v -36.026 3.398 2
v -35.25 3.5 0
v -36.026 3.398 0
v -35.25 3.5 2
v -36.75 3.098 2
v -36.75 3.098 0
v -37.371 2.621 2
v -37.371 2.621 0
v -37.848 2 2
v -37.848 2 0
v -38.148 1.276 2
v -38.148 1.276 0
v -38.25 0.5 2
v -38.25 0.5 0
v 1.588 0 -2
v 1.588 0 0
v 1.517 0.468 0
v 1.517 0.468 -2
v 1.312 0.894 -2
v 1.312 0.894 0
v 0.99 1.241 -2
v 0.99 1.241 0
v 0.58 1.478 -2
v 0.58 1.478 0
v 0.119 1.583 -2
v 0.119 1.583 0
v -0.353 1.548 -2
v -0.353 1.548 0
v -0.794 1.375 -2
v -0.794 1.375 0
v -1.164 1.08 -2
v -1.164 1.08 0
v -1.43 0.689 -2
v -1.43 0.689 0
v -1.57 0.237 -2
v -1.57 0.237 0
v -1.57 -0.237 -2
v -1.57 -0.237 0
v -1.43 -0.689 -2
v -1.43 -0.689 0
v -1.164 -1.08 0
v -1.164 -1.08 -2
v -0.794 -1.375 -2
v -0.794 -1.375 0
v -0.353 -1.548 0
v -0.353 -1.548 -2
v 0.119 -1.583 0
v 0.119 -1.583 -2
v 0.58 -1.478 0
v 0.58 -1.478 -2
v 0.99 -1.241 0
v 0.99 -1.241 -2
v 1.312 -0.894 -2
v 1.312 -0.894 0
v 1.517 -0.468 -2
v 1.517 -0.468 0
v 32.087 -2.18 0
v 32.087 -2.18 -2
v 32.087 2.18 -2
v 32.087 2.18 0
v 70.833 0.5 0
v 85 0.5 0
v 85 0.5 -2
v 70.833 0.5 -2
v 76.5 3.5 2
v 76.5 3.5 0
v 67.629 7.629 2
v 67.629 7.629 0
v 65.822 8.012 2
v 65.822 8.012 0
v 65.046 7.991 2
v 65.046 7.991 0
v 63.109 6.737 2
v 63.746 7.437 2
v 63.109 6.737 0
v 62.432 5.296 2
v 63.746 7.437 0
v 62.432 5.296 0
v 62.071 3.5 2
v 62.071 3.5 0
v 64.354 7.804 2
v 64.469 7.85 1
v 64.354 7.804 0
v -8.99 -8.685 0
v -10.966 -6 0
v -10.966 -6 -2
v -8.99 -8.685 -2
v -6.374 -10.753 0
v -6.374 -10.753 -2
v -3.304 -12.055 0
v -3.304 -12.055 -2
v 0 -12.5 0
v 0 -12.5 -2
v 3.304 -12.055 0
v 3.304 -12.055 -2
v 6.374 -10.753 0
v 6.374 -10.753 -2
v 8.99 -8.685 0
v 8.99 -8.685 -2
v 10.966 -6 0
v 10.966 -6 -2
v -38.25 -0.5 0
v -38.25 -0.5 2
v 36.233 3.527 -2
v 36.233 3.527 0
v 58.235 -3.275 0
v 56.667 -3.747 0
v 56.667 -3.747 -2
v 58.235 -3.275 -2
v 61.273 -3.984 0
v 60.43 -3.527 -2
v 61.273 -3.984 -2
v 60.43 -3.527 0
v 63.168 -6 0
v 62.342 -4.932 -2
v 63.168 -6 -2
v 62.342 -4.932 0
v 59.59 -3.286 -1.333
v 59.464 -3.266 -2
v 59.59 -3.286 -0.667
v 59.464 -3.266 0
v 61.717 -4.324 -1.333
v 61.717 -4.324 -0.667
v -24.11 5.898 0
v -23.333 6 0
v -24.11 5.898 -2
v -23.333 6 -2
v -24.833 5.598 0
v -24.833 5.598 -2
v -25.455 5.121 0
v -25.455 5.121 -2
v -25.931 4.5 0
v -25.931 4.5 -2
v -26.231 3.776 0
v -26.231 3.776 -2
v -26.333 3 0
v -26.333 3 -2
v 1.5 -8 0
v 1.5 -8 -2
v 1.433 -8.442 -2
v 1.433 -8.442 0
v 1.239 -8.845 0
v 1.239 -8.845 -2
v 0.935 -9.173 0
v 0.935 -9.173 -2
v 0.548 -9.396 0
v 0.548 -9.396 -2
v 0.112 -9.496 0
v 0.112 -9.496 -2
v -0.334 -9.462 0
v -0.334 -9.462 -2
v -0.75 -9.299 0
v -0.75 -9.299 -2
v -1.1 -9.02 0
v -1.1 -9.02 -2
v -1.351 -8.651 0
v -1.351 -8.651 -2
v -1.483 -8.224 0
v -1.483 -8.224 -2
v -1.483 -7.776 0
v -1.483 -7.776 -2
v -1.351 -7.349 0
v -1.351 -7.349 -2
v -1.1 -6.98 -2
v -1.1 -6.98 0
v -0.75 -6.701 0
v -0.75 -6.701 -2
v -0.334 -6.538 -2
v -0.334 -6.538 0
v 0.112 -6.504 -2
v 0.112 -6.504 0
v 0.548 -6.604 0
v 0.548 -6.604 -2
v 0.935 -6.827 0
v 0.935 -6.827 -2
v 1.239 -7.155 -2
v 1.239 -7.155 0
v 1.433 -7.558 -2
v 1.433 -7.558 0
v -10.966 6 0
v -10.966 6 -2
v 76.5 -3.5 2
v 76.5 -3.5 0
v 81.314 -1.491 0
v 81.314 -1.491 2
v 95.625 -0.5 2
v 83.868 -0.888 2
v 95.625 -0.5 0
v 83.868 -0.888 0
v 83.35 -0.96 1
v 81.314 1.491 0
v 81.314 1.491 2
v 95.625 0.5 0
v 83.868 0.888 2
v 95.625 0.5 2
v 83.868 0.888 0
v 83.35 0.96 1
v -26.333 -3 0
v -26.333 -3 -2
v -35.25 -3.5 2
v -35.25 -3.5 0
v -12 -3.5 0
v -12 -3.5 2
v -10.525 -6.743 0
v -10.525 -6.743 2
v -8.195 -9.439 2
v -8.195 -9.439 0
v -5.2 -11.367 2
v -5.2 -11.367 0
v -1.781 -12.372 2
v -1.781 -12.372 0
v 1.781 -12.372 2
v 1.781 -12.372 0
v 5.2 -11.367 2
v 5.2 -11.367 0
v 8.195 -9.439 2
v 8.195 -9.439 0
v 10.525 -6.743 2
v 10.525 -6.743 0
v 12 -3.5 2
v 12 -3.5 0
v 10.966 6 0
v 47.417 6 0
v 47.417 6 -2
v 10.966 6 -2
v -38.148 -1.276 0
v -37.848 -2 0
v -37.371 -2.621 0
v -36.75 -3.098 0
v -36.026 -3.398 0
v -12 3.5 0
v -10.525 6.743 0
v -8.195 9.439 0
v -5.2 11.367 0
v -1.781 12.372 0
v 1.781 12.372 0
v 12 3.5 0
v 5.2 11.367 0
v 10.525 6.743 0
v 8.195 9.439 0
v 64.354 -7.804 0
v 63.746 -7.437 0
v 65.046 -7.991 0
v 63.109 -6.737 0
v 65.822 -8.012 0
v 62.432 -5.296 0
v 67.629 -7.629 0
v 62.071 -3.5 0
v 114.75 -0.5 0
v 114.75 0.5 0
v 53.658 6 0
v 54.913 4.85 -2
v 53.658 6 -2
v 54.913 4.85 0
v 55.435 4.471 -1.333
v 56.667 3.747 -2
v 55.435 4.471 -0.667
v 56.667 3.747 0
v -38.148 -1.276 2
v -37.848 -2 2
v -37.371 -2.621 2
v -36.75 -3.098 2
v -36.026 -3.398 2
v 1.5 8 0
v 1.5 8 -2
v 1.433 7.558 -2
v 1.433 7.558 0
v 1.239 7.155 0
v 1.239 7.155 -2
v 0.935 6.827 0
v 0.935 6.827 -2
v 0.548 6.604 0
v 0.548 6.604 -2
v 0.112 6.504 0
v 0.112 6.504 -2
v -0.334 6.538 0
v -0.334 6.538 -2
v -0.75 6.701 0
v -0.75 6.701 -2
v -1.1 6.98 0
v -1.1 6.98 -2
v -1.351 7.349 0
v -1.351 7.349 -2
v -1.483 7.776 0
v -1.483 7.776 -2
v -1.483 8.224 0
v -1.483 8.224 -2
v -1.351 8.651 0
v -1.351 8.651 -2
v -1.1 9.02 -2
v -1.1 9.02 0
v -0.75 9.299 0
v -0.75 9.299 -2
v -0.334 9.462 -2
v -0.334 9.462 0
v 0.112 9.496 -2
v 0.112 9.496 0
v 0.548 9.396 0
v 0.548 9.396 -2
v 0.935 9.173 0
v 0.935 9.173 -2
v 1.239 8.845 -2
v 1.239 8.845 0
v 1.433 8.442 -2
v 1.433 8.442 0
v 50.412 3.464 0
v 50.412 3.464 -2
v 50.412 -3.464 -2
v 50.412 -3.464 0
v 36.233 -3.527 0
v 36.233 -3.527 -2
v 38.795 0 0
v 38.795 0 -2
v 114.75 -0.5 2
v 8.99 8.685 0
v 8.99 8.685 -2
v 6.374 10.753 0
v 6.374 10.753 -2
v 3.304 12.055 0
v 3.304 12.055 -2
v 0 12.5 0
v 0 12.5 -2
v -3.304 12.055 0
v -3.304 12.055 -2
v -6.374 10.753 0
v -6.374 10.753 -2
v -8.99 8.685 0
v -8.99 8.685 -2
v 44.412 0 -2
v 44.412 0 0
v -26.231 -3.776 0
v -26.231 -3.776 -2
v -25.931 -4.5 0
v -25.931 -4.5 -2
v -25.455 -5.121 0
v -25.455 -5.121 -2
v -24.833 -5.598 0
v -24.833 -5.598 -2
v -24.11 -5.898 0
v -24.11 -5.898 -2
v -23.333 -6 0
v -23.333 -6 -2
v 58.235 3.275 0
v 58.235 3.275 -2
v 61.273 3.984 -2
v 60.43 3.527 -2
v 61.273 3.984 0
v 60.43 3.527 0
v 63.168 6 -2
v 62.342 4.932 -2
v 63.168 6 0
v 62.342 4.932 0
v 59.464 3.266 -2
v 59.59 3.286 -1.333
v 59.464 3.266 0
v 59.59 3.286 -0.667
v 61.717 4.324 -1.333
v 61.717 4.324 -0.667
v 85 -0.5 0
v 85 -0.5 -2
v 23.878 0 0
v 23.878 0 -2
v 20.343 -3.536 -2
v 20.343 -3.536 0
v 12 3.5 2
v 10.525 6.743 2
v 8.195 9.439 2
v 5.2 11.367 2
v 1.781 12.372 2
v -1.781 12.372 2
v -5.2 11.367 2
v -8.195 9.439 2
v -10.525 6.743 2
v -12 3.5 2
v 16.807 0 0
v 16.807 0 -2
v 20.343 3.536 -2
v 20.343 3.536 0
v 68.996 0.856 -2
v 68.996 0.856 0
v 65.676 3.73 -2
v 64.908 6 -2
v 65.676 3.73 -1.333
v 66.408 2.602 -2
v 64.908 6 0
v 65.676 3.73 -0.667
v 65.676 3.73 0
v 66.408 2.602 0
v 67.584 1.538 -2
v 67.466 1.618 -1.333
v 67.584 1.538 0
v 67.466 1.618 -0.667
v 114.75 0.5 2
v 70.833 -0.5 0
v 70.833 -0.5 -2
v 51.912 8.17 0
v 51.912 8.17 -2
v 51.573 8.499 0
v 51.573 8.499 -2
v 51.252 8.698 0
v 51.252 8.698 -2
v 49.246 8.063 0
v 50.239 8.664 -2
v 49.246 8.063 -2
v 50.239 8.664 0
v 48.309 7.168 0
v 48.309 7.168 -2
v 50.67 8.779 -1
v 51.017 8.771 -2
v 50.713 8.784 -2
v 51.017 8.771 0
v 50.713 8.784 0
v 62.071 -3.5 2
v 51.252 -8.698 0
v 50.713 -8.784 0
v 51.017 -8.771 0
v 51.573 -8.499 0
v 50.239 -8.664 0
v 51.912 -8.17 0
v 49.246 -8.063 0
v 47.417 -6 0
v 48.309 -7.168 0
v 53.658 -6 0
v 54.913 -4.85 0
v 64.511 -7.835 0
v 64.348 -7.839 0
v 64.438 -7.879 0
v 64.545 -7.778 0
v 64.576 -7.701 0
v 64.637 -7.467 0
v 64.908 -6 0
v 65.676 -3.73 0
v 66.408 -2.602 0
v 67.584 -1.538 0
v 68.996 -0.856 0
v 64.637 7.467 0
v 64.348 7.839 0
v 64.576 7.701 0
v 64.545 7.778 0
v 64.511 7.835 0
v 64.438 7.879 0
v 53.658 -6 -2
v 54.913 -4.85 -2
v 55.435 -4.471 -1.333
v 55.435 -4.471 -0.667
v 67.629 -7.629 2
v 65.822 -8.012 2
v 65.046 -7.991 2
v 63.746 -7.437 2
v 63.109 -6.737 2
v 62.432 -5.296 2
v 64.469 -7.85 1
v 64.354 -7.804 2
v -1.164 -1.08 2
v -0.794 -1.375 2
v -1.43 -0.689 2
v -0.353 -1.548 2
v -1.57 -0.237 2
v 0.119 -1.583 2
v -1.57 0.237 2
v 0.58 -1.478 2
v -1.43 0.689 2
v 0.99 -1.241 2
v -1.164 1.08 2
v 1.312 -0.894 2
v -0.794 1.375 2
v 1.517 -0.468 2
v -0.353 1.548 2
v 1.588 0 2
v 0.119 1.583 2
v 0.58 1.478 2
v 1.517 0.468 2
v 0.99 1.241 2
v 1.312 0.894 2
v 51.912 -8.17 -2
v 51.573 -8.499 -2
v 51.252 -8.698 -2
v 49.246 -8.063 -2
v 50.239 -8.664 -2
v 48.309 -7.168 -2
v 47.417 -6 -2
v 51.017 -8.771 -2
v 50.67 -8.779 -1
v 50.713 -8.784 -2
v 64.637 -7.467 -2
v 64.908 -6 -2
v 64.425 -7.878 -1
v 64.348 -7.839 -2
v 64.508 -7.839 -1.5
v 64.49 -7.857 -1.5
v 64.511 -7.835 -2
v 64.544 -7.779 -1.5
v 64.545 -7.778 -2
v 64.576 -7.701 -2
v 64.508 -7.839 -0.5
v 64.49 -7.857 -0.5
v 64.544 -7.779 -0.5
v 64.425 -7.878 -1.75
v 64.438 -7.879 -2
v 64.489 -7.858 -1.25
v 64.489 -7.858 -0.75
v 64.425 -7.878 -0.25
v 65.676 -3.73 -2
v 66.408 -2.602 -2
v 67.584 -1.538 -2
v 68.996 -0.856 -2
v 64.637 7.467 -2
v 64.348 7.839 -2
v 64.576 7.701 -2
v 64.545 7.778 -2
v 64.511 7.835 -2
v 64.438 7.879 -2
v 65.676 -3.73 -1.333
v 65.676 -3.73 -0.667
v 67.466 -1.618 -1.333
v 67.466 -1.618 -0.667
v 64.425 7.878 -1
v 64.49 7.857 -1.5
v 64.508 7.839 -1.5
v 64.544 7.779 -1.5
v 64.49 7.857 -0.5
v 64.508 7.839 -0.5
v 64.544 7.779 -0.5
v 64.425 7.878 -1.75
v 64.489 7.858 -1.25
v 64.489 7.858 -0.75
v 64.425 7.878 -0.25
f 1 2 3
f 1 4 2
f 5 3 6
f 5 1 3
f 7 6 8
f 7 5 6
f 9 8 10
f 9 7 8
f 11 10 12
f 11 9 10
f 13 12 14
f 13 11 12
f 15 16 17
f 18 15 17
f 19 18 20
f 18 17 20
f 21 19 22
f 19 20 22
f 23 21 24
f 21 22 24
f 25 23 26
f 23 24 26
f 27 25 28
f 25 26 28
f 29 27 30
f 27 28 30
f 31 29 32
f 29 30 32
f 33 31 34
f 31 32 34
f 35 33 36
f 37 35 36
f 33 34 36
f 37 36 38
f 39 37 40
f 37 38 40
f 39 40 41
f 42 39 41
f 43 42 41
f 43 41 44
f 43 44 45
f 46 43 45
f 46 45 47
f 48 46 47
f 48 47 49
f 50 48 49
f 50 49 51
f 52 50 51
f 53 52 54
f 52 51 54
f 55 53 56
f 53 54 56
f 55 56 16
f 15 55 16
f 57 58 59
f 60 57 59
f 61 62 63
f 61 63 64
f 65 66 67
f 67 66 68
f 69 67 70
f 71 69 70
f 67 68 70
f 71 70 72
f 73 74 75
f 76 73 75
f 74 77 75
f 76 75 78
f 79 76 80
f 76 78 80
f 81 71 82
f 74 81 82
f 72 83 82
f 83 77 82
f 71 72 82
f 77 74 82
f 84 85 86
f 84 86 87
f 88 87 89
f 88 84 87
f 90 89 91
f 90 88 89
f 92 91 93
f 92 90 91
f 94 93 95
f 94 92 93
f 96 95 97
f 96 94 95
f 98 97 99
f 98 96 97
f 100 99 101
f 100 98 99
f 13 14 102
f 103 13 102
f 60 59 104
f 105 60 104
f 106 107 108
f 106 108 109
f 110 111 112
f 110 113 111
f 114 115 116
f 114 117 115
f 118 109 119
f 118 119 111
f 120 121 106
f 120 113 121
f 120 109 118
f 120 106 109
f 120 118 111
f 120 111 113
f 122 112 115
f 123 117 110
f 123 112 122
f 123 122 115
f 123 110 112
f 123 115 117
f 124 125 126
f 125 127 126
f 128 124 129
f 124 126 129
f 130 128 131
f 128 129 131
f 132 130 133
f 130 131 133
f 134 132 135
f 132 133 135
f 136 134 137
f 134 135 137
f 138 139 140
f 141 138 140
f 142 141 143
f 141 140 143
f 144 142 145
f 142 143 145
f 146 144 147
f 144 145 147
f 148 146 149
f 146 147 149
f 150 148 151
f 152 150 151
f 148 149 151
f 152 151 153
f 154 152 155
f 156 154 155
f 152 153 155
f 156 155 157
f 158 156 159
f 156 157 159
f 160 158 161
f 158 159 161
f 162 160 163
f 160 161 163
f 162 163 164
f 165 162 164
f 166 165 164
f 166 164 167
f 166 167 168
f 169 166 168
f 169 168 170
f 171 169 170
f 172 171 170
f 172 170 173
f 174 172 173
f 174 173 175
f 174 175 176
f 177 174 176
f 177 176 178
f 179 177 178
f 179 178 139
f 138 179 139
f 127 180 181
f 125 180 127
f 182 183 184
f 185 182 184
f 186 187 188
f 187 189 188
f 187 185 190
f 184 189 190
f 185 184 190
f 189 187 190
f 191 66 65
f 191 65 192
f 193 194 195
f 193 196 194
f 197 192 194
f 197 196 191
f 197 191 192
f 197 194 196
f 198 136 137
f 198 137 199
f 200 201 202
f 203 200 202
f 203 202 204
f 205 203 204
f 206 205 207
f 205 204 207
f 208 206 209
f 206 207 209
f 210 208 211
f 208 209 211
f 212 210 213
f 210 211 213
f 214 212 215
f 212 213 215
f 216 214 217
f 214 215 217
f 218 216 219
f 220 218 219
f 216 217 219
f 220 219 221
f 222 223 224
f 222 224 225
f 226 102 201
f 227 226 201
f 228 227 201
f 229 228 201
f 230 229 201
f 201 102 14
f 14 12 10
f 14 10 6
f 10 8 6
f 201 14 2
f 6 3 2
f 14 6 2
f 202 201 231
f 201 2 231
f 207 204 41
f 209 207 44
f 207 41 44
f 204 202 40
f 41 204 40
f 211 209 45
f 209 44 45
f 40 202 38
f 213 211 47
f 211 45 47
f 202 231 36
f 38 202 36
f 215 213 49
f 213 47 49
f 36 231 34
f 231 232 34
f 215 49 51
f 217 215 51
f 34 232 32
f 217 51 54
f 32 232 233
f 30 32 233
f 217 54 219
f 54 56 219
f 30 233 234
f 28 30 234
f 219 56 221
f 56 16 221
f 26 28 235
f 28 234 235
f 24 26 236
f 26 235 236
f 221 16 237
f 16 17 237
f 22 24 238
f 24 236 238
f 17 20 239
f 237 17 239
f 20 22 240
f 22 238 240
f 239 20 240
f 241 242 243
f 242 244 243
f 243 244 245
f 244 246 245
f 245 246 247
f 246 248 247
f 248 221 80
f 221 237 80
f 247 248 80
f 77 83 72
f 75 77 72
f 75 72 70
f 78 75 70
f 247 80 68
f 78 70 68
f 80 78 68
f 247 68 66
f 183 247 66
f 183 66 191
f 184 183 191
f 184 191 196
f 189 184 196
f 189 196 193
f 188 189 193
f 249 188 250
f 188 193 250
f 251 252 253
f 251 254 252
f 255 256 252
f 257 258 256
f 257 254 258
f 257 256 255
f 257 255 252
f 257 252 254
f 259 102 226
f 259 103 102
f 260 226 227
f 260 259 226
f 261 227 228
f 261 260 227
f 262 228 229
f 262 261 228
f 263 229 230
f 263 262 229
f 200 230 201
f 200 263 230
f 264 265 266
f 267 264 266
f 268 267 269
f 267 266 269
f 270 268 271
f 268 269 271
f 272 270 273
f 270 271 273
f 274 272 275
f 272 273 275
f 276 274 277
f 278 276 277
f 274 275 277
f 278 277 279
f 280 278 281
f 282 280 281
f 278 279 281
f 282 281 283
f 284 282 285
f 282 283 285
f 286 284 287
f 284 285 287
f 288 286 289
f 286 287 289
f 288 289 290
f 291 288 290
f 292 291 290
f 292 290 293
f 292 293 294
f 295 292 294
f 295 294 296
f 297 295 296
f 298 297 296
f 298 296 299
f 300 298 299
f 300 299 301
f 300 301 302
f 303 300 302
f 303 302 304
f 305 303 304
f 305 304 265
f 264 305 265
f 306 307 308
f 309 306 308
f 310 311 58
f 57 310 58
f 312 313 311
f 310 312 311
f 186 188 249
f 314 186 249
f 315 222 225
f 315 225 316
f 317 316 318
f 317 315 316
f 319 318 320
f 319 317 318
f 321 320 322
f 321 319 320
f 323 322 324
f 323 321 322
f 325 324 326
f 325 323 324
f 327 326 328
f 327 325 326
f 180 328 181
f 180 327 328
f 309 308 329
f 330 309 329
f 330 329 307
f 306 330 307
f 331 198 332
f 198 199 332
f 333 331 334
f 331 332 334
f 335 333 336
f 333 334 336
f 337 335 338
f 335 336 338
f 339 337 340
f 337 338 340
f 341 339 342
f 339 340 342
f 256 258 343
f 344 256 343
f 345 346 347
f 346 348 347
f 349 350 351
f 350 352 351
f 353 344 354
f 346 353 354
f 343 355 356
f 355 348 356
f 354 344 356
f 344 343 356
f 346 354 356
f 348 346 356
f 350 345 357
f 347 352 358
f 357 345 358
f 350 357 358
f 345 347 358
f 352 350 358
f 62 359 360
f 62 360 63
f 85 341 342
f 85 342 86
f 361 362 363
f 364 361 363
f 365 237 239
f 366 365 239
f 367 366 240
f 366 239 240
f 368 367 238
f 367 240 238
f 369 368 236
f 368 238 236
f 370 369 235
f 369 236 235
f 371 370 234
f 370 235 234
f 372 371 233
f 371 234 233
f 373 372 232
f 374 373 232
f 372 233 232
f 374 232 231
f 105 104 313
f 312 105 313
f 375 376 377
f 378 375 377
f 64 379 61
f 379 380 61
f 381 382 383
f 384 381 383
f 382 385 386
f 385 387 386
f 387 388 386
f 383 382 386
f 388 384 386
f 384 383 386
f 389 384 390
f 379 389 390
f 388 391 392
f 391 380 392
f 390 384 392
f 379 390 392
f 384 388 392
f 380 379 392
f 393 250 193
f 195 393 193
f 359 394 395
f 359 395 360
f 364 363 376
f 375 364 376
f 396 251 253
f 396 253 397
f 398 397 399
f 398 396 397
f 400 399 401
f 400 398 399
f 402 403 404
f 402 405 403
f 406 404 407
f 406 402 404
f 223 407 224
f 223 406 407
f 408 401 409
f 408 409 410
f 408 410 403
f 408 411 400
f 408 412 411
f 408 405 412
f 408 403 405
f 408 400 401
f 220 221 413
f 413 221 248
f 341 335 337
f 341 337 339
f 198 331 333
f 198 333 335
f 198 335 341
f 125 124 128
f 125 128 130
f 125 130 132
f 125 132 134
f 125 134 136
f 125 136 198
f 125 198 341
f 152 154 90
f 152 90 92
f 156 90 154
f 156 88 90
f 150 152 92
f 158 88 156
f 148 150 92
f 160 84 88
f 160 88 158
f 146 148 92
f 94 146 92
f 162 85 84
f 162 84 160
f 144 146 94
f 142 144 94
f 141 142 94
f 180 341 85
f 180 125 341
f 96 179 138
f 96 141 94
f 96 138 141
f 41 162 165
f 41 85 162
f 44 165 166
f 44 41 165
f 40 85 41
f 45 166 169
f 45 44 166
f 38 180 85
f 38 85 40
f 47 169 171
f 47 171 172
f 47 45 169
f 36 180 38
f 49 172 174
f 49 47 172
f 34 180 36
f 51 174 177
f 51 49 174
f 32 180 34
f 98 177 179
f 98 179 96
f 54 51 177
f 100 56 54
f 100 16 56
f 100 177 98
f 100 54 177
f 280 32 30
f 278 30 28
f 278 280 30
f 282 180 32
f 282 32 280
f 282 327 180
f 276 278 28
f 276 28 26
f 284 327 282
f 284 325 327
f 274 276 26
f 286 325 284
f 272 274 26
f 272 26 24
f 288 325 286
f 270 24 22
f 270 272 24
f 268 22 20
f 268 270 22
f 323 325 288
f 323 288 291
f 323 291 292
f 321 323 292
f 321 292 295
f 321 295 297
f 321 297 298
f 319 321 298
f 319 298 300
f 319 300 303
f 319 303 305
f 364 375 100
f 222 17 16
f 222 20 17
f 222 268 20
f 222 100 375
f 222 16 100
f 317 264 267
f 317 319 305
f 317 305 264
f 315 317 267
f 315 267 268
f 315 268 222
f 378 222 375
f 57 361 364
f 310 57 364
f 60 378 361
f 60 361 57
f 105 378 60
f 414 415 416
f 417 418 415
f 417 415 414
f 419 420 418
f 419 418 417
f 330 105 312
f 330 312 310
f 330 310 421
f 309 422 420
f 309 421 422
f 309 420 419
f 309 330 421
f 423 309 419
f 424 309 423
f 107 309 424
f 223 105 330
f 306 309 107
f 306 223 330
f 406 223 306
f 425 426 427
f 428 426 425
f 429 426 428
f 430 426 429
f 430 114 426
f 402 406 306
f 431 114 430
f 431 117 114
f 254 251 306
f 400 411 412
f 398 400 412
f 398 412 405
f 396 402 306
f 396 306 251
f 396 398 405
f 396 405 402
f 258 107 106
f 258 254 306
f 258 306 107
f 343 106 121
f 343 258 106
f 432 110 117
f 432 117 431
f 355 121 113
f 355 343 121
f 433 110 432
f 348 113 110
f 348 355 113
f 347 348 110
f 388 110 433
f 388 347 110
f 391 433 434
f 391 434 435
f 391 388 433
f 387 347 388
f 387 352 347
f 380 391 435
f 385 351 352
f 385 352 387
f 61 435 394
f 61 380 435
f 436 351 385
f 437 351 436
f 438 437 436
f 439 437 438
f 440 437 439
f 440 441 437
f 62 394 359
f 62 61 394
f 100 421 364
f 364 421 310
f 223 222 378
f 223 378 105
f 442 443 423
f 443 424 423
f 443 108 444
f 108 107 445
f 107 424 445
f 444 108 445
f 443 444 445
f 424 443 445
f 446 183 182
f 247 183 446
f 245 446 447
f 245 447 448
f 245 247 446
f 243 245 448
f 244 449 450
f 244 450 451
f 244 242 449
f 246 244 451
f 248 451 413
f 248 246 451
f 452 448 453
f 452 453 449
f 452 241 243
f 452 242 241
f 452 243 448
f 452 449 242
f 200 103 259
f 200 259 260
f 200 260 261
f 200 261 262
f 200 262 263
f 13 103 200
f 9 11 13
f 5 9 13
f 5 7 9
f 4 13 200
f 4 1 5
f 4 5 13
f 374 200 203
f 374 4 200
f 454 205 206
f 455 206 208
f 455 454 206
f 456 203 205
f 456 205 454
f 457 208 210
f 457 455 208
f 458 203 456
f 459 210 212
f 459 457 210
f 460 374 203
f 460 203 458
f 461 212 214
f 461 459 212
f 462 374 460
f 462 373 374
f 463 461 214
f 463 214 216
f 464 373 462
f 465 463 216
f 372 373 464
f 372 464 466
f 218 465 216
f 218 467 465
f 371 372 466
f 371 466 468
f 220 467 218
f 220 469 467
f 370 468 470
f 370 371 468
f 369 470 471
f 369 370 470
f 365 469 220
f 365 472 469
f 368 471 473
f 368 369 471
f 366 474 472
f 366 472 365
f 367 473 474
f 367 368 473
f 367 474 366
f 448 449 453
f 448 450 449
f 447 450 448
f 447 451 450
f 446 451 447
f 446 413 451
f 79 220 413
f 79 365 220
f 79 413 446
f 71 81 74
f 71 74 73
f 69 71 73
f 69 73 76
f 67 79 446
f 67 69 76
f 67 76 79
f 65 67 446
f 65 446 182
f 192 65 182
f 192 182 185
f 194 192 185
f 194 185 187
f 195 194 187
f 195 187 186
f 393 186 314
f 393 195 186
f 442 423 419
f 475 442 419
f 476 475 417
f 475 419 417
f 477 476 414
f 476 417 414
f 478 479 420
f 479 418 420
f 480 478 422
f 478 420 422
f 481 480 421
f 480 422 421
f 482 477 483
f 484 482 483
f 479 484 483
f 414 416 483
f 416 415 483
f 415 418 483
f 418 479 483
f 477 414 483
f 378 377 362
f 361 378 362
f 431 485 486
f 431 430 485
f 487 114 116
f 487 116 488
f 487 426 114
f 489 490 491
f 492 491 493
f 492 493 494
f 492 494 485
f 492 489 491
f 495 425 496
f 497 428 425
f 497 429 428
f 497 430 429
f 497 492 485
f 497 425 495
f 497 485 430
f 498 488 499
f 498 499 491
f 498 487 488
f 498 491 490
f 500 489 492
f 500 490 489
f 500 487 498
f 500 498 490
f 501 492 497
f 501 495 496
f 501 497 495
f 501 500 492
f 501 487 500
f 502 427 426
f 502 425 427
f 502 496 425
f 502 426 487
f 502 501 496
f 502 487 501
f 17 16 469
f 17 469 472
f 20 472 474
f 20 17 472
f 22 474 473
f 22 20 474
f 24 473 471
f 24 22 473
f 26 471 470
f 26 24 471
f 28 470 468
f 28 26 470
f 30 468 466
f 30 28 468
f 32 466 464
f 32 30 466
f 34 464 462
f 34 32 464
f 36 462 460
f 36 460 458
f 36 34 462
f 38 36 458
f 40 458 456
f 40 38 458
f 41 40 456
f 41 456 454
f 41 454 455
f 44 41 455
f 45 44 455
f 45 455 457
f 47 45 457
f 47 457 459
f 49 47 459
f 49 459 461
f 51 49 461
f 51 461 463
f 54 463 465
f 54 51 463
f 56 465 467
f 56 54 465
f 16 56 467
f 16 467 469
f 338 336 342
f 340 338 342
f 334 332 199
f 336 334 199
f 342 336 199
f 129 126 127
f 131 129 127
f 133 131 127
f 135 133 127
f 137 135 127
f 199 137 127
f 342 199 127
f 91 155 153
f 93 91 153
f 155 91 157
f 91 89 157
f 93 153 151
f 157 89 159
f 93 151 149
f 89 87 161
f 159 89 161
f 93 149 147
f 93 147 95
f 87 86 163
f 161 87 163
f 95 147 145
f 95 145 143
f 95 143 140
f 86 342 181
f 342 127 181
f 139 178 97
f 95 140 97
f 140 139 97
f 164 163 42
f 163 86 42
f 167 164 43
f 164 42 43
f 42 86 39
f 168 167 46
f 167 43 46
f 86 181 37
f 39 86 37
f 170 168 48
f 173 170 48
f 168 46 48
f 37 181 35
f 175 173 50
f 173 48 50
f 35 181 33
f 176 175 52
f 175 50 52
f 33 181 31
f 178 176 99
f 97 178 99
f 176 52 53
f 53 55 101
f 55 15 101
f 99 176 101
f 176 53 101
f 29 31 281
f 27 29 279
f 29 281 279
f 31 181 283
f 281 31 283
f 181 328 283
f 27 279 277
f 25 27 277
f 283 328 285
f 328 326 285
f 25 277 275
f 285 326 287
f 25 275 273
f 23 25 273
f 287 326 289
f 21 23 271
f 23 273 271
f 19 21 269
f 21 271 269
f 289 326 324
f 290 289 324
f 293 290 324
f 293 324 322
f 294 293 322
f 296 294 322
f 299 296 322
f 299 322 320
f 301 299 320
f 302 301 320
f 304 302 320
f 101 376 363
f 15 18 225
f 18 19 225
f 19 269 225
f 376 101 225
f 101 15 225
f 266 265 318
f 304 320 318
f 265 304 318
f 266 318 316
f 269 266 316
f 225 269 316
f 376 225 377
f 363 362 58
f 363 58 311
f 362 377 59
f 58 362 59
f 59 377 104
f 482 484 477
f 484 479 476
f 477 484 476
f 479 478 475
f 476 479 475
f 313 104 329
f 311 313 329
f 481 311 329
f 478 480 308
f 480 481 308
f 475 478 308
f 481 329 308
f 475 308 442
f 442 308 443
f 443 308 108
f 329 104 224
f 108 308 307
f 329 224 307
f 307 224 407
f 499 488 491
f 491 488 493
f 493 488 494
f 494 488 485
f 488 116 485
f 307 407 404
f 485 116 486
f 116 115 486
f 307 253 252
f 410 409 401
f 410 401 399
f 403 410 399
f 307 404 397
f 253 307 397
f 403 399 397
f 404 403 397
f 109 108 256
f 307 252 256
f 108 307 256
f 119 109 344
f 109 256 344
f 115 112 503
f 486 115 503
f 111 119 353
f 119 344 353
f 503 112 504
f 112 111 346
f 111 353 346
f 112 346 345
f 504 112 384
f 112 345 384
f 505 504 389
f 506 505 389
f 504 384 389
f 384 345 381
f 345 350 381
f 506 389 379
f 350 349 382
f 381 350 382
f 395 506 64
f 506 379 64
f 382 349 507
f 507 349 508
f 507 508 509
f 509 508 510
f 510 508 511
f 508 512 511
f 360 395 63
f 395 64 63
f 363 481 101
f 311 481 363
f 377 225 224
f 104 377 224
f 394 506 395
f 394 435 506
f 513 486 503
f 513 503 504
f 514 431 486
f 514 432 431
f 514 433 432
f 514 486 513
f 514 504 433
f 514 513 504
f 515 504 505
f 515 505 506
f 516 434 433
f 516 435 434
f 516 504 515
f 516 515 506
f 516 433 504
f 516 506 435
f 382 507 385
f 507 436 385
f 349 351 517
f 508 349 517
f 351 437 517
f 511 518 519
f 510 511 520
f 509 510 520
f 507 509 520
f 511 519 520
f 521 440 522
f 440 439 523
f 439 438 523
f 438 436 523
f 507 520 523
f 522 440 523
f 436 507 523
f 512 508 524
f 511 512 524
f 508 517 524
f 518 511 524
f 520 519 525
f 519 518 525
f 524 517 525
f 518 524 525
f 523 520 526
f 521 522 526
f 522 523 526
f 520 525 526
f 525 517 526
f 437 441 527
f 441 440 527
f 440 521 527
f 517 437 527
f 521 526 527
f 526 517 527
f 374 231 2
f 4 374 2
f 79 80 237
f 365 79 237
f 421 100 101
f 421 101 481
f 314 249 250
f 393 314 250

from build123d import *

# Parameters (mm, degrees)
F0_R     = 1.5875
F1_DEPTH = 2
F2_R     = 1.5875
F3_DEPTH = 2
F4_R     = 3
F4_2_R   = 3
F6_DEPTH = 25
F7_R     = 1.5
F8_DEPTH = 25


with BuildPart() as f1:
    # F0 (on Top) → F1 (new body)
    with BuildSketch(Plane.XY):
        with BuildLine():
            ThreePointArc((-12, -3.5), (-12.5, 0), (-12, 3.5))
            Line((-12, 3.5), (-38.25, 3.5))
            Line((-38.25, 3.5), (-38.25, -3.5))
            Line((-38.25, -3.5), (-12, -3.5))
        make_face()
        with BuildLine():
            Line((-12, 3.5), (12, 3.5))
            ThreePointArc((12, 3.5), (0, 12.5), (-12, 3.5))
        make_face()
        with BuildLine():
            Line((62.0709539045, 3.5), (76.5, 3.5))
            add(Edge.make_bspline(
                [(76.5, 3.5), (71.9907153616, 5.4354000871), (64.55282786, 10.6078306891), (62.2970592122, 5.6150011273), (62.0709539045, 3.5)],
                knots=[0, 0, 0, 0, 0.5556190741, 0.8480780717, 0.8480780717, 0.8480780717, 0.8480780717], degree=3))
        make_face()
        with BuildLine():
            Line((12, -3.5), (-12, -3.5))
            ThreePointArc((-12, -3.5), (0, -12.5), (12, -3.5))
        make_face()
        with BuildLine():
            Line((76.5, -3.5), (62.0709539045, -3.5))
            add(Edge.make_bspline(
                [(76.5, -3.5), (71.9907153616, -5.4354000871), (64.55282786, -10.6078306891), (62.2970592122, -5.6150011273), (62.0709539045, -3.5)],
                knots=[0, 0, 0, 0, 0.5556190741, 0.8480780717, 0.8480780717, 0.8480780717, 0.8480780717], degree=3))
        make_face()
        with BuildLine():
            add(Edge.make_bspline(
                [(62.0709539045, 3.5), (61.9535003312, 2.401333), (61.9849445935, 1.196556193), (62.15625, 0)],
                knots=[0.8480780717, 0.8480780717, 0.8480780717, 0.8480780717, 1, 1, 1, 1], degree=3))
            Line((62.0709539045, 3.5), (12, 3.5))
            ThreePointArc((12, 3.5), (12.3743686708, 1.767766953), (12.5, 0))
            ThreePointArc((12.5, 0), (12.3743686708, -1.767766953), (12, -3.5))
            Line((12, -3.5), (62.0709539045, -3.5))
            add(Edge.make_bspline(
                [(62.0709539045, -3.5), (61.9535003312, -2.401333), (61.9849445935, -1.196556193), (62.15625, 0)],
                knots=[0.8480780717, 0.8480780717, 0.8480780717, 0.8480780717, 1, 1, 1, 1], degree=3))
        make_face()
        with BuildLine():
            ThreePointArc((12.5, 0), (12.3743686708, 1.767766953), (12, 3.5))
            Line((12, 3.5), (-12, 3.5))
            ThreePointArc((-12, 3.5), (-12.5, 0), (-12, -3.5))
            Line((-12, -3.5), (12, -3.5))
            ThreePointArc((12, -3.5), (12.3743686708, -1.767766953), (12.5, 0))
        make_face()
        Circle(F0_R, mode=Mode.SUBTRACT)
        with BuildLine():
            add(Edge.make_bspline(
                [(76.5, 3.5), (81.2292632272, 1.3920385639), (83.5245438479, 0.7969108606), (86.4633302777, 0.6546642008), (95.625, 0.5)],
                knots=[0, 0, 0, 0, 0.4354164629, 1, 1, 1, 1], degree=3))
            Line((76.5, 3.5), (62.0709539045, 3.5))
            add(Edge.make_bspline(
                [(62.0709539045, 3.5), (61.9535003312, 2.401333), (61.9849445935, 1.196556193), (62.15625, 0)],
                knots=[0.8480780717, 0.8480780717, 0.8480780717, 0.8480780717, 1, 1, 1, 1], degree=3))
            add(Edge.make_bspline(
                [(62.0709539045, -3.5), (61.9535003312, -2.401333), (61.9849445935, -1.196556193), (62.15625, 0)],
                knots=[0.8480780717, 0.8480780717, 0.8480780717, 0.8480780717, 1, 1, 1, 1], degree=3))
            Line((62.0709539045, -3.5), (76.5, -3.5))
            add(Edge.make_bspline(
                [(76.5, -3.5), (81.2292632272, -1.3920385639), (83.5245438479, -0.7969108606), (86.4633302777, -0.6546642008), (95.625, -0.5)],
                knots=[0, 0, 0, 0, 0.4354164629, 1, 1, 1, 1], degree=3))
            Line((95.625, -0.5), (114.75, -0.5))
            Line((114.75, -0.5), (114.75, 0.5))
            Line((114.75, 0.5), (95.625, 0.5))
        make_face()
    extrude(amount=F1_DEPTH)

    # F4
    f4_edges = [f1.edges().sort_by_distance(p)[0] for p in [
        (-38.25, 3.5, 1),
        (-38.25, -3.5, 1),
    ]]
    fillet(f4_edges, radius=F4_R)


with BuildPart() as f3:
    # F2 (on Top) → F3 (new body)
    with BuildSketch(Plane.XY):
        with BuildLine():
            Line((-10.9658560997, 6), (-26.33333333, 6))
            Line((-26.33333333, 6), (-26.33333333, -6))
            Line((-26.33333333, -6), (-10.9658560997, -6))
            ThreePointArc((-10.9658560997, -6), (-12.5, 0), (-10.9658560997, 6))
        make_face()
        with BuildLine():
            ThreePointArc((10.9658560997, 6), (0, 12.5), (-10.9658560997, 6))
            Line((-10.9658560997, 6), (10.9658560997, 6))
        make_face()
        with BuildLine():
            Line((10.9658560997, -6), (-10.9658560997, -6))
            ThreePointArc((-10.9658560997, -6), (0, -12.5), (10.9658560997, -6))
        make_face()
        with BuildLine():
            Line((53.6581738244, 6), (47.4167542526, 6))
            add(Edge.make_bspline(
                [(47.4167542526, 6), (46.3220957553, 4.3280086445), (45.5684344657, 2.1206918096), (46.0416666667, 0)],
                knots=[0.726906329, 0.726906329, 0.726906329, 0.726906329, 1, 1, 1, 1], degree=3))
            add(Edge.make_bspline(
                [(47.4167542526, -6), (46.3220957553, -4.3280086445), (45.5684344657, -2.1206918096), (46.0416666667, 0)],
                knots=[0.726906329, 0.726906329, 0.726906329, 0.726906329, 1, 1, 1, 1], degree=3))
            Line((47.4167542526, -6), (53.6581738244, -6))
            add(Edge.make_bspline(
                [(56.6666666667, -3.747044364), (55.2992674084, -4.4409490289), (54.3604326541, -5.2428049781), (53.6581738244, -6)],
                knots=[0, 0, 0, 0, 0.1542850544, 0.1542850544, 0.1542850544, 0.1542850544], degree=3))
            add(Edge.make_bspline(
                [(56.6666666667, -3.747044364), (60.0277227864, -2.2489301029), (62.0161168237, -4.2916810168), (63.1679295713, -6)],
                knots=[0, 0, 0, 0, 0.3094476025, 0.3094476025, 0.3094476025, 0.3094476025], degree=3))
            Line((63.1679295713, -6), (64.907909688, -6))
            add(Edge.make_bspline(
                [(64.907909688, -6), (65.3495372223, -3.9292189456), (66.4917594583, -0.8436001546), (70.8333333333, -0.5)],
                knots=[0.6644360976, 0.6644360976, 0.6644360976, 0.6644360976, 1, 1, 1, 1], degree=3))
            Line((70.8333333333, -0.5), (85, -0.5))
            Line((85, -0.5), (85, 0.5))
            Line((85, 0.5), (70.8333333333, 0.5))
            add(Edge.make_bspline(
                [(64.907909688, 6), (65.3495372223, 3.9292189456), (66.4917594583, 0.8436001546), (70.8333333333, 0.5)],
                knots=[0.6644360976, 0.6644360976, 0.6644360976, 0.6644360976, 1, 1, 1, 1], degree=3))
            Line((64.907909688, 6), (63.1679295713, 6))
            add(Edge.make_bspline(
                [(56.6666666667, 3.747044364), (60.0277227864, 2.2489301029), (62.0161168237, 4.2916810168), (63.1679295713, 6)],
                knots=[0, 0, 0, 0, 0.3094476025, 0.3094476025, 0.3094476025, 0.3094476025], degree=3))
            add(Edge.make_bspline(
                [(56.6666666667, 3.747044364), (55.2992674084, 4.4409490289), (54.3604326541, 5.2428049781), (53.6581738244, 6)],
                knots=[0, 0, 0, 0, 0.1542850544, 0.1542850544, 0.1542850544, 0.1542850544], degree=3))
        make_face()
        with BuildLine():
            Line((47.4167542526, 6), (10.9658560997, 6))
            ThreePointArc((10.9658560997, 6), (12.1103922572, 3.0965140685), (12.5, 0))
            ThreePointArc((12.5, 0), (12.1103922572, -3.0965140685), (10.9658560997, -6))
            Line((10.9658560997, -6), (47.4167542526, -6))
            add(Edge.make_bspline(
                [(47.4167542526, -6), (46.3220957553, -4.3280086445), (45.5684344657, -2.1206918096), (46.0416666667, 0)],
                knots=[0.726906329, 0.726906329, 0.726906329, 0.726906329, 1, 1, 1, 1], degree=3))
            add(Edge.make_bspline(
                [(47.4167542526, 6), (46.3220957553, 4.3280086445), (45.5684344657, 2.1206918096), (46.0416666667, 0)],
                knots=[0.726906329, 0.726906329, 0.726906329, 0.726906329, 1, 1, 1, 1], degree=3))
        make_face()
        with BuildLine():
            Line((10.9658560997, 6), (-10.9658560997, 6))
            ThreePointArc((-10.9658560997, 6), (-12.5, 0), (-10.9658560997, -6))
            Line((-10.9658560997, -6), (10.9658560997, -6))
            ThreePointArc((10.9658560997, -6), (12.1103922572, -3.0965140685), (12.5, 0))
            ThreePointArc((12.5, 0), (12.1103922572, 3.0965140685), (10.9658560997, 6))
        make_face()
        Circle(F2_R, mode=Mode.SUBTRACT)
        with BuildLine():
            Line((64.907909688, -6), (63.1679295713, -6))
            add(Edge.make_bspline(
                [(63.1679295713, -6), (63.8278590037, -6.9787788677), (64.5993236597, -8.718696784), (64.6740549365, -7.0965393941), (64.907909688, -6)],
                knots=[0.3094476025, 0.3094476025, 0.3094476025, 0.3094476025, 0.4867451547, 0.6644360976, 0.6644360976, 0.6644360976, 0.6644360976], degree=3))
        make_face()
        with BuildLine():
            add(Edge.make_bspline(
                [(63.1679295713, 6), (63.8278590037, 6.9787788677), (64.5993236597, 8.718696784), (64.6740549365, 7.0965393941), (64.907909688, 6)],
                knots=[0.3094476025, 0.3094476025, 0.3094476025, 0.3094476025, 0.4867451547, 0.6644360976, 0.6644360976, 0.6644360976, 0.6644360976], degree=3))
            Line((63.1679295713, 6), (64.907909688, 6))
        make_face()
        with BuildLine():
            add(Edge.make_bspline(
                [(53.6581738244, 6), (52.2194091826, 7.5513160935), (51.4119093355, 10.0220105563), (48.4450081755, 7.5705644038), (47.4167542526, 6)],
                knots=[0.1542850544, 0.1542850544, 0.1542850544, 0.1542850544, 0.4703791662, 0.726906329, 0.726906329, 0.726906329, 0.726906329], degree=3))
            Line((47.4167542526, 6), (53.6581738244, 6))
        make_face()
        with BuildLine():
            Line((53.6581738244, -6), (47.4167542526, -6))
            add(Edge.make_bspline(
                [(53.6581738244, -6), (52.2194091826, -7.5513160935), (51.4119093355, -10.0220105563), (48.4450081755, -7.5705644038), (47.4167542526, -6)],
                knots=[0.1542850544, 0.1542850544, 0.1542850544, 0.1542850544, 0.4703791662, 0.726906329, 0.726906329, 0.726906329, 0.726906329], degree=3))
        make_face()
    extrude(amount=-F3_DEPTH)

    # F4#2
    f4_2_edges = [f3.edges().sort_by_distance(p)[0] for p in [
        (-26.333333, 6, -1),
        (-26.333333, -6, -1),
    ]]
    fillet(f4_2_edges, radius=F4_2_R)

    # F5 (on face) → F6 (cut)
    with BuildSketch(Plane(origin=(0, 0, -2), x_dir=(1, 0, 0), z_dir=(0, 0, -1))):
        Polygon((44.4125, 0), (50.4125, -3.4641016151), (50.4125, 3.4641016151), align=None)
        Polygon((36.2327160732, -3.5267115138), (38.7950219719, 0), (36.2327160732, 3.5267115138), (32.0868180394, 2.179627584), (32.0868180394, -2.179627584), align=None)
        Polygon((20.3425250947, -3.5355339059), (23.8780590007, 0), (20.3425250947, 3.5355339059), (16.8069911888, 0), align=None)
    extrude(amount=-F6_DEPTH, mode=Mode.SUBTRACT)

    # F7 (on face) → F8 (cut)
    with BuildSketch(Plane(origin=(0, 0, -2), x_dir=(1, 0, 0), z_dir=(0, 0, -1))):
        with Locations((0, 8)):
            Circle(F7_R)
        with Locations((0, -8)):
            Circle(F7_R)
    extrude(amount=-F8_DEPTH, mode=Mode.SUBTRACT)


solid = Compound([f1.part, f3.part])
